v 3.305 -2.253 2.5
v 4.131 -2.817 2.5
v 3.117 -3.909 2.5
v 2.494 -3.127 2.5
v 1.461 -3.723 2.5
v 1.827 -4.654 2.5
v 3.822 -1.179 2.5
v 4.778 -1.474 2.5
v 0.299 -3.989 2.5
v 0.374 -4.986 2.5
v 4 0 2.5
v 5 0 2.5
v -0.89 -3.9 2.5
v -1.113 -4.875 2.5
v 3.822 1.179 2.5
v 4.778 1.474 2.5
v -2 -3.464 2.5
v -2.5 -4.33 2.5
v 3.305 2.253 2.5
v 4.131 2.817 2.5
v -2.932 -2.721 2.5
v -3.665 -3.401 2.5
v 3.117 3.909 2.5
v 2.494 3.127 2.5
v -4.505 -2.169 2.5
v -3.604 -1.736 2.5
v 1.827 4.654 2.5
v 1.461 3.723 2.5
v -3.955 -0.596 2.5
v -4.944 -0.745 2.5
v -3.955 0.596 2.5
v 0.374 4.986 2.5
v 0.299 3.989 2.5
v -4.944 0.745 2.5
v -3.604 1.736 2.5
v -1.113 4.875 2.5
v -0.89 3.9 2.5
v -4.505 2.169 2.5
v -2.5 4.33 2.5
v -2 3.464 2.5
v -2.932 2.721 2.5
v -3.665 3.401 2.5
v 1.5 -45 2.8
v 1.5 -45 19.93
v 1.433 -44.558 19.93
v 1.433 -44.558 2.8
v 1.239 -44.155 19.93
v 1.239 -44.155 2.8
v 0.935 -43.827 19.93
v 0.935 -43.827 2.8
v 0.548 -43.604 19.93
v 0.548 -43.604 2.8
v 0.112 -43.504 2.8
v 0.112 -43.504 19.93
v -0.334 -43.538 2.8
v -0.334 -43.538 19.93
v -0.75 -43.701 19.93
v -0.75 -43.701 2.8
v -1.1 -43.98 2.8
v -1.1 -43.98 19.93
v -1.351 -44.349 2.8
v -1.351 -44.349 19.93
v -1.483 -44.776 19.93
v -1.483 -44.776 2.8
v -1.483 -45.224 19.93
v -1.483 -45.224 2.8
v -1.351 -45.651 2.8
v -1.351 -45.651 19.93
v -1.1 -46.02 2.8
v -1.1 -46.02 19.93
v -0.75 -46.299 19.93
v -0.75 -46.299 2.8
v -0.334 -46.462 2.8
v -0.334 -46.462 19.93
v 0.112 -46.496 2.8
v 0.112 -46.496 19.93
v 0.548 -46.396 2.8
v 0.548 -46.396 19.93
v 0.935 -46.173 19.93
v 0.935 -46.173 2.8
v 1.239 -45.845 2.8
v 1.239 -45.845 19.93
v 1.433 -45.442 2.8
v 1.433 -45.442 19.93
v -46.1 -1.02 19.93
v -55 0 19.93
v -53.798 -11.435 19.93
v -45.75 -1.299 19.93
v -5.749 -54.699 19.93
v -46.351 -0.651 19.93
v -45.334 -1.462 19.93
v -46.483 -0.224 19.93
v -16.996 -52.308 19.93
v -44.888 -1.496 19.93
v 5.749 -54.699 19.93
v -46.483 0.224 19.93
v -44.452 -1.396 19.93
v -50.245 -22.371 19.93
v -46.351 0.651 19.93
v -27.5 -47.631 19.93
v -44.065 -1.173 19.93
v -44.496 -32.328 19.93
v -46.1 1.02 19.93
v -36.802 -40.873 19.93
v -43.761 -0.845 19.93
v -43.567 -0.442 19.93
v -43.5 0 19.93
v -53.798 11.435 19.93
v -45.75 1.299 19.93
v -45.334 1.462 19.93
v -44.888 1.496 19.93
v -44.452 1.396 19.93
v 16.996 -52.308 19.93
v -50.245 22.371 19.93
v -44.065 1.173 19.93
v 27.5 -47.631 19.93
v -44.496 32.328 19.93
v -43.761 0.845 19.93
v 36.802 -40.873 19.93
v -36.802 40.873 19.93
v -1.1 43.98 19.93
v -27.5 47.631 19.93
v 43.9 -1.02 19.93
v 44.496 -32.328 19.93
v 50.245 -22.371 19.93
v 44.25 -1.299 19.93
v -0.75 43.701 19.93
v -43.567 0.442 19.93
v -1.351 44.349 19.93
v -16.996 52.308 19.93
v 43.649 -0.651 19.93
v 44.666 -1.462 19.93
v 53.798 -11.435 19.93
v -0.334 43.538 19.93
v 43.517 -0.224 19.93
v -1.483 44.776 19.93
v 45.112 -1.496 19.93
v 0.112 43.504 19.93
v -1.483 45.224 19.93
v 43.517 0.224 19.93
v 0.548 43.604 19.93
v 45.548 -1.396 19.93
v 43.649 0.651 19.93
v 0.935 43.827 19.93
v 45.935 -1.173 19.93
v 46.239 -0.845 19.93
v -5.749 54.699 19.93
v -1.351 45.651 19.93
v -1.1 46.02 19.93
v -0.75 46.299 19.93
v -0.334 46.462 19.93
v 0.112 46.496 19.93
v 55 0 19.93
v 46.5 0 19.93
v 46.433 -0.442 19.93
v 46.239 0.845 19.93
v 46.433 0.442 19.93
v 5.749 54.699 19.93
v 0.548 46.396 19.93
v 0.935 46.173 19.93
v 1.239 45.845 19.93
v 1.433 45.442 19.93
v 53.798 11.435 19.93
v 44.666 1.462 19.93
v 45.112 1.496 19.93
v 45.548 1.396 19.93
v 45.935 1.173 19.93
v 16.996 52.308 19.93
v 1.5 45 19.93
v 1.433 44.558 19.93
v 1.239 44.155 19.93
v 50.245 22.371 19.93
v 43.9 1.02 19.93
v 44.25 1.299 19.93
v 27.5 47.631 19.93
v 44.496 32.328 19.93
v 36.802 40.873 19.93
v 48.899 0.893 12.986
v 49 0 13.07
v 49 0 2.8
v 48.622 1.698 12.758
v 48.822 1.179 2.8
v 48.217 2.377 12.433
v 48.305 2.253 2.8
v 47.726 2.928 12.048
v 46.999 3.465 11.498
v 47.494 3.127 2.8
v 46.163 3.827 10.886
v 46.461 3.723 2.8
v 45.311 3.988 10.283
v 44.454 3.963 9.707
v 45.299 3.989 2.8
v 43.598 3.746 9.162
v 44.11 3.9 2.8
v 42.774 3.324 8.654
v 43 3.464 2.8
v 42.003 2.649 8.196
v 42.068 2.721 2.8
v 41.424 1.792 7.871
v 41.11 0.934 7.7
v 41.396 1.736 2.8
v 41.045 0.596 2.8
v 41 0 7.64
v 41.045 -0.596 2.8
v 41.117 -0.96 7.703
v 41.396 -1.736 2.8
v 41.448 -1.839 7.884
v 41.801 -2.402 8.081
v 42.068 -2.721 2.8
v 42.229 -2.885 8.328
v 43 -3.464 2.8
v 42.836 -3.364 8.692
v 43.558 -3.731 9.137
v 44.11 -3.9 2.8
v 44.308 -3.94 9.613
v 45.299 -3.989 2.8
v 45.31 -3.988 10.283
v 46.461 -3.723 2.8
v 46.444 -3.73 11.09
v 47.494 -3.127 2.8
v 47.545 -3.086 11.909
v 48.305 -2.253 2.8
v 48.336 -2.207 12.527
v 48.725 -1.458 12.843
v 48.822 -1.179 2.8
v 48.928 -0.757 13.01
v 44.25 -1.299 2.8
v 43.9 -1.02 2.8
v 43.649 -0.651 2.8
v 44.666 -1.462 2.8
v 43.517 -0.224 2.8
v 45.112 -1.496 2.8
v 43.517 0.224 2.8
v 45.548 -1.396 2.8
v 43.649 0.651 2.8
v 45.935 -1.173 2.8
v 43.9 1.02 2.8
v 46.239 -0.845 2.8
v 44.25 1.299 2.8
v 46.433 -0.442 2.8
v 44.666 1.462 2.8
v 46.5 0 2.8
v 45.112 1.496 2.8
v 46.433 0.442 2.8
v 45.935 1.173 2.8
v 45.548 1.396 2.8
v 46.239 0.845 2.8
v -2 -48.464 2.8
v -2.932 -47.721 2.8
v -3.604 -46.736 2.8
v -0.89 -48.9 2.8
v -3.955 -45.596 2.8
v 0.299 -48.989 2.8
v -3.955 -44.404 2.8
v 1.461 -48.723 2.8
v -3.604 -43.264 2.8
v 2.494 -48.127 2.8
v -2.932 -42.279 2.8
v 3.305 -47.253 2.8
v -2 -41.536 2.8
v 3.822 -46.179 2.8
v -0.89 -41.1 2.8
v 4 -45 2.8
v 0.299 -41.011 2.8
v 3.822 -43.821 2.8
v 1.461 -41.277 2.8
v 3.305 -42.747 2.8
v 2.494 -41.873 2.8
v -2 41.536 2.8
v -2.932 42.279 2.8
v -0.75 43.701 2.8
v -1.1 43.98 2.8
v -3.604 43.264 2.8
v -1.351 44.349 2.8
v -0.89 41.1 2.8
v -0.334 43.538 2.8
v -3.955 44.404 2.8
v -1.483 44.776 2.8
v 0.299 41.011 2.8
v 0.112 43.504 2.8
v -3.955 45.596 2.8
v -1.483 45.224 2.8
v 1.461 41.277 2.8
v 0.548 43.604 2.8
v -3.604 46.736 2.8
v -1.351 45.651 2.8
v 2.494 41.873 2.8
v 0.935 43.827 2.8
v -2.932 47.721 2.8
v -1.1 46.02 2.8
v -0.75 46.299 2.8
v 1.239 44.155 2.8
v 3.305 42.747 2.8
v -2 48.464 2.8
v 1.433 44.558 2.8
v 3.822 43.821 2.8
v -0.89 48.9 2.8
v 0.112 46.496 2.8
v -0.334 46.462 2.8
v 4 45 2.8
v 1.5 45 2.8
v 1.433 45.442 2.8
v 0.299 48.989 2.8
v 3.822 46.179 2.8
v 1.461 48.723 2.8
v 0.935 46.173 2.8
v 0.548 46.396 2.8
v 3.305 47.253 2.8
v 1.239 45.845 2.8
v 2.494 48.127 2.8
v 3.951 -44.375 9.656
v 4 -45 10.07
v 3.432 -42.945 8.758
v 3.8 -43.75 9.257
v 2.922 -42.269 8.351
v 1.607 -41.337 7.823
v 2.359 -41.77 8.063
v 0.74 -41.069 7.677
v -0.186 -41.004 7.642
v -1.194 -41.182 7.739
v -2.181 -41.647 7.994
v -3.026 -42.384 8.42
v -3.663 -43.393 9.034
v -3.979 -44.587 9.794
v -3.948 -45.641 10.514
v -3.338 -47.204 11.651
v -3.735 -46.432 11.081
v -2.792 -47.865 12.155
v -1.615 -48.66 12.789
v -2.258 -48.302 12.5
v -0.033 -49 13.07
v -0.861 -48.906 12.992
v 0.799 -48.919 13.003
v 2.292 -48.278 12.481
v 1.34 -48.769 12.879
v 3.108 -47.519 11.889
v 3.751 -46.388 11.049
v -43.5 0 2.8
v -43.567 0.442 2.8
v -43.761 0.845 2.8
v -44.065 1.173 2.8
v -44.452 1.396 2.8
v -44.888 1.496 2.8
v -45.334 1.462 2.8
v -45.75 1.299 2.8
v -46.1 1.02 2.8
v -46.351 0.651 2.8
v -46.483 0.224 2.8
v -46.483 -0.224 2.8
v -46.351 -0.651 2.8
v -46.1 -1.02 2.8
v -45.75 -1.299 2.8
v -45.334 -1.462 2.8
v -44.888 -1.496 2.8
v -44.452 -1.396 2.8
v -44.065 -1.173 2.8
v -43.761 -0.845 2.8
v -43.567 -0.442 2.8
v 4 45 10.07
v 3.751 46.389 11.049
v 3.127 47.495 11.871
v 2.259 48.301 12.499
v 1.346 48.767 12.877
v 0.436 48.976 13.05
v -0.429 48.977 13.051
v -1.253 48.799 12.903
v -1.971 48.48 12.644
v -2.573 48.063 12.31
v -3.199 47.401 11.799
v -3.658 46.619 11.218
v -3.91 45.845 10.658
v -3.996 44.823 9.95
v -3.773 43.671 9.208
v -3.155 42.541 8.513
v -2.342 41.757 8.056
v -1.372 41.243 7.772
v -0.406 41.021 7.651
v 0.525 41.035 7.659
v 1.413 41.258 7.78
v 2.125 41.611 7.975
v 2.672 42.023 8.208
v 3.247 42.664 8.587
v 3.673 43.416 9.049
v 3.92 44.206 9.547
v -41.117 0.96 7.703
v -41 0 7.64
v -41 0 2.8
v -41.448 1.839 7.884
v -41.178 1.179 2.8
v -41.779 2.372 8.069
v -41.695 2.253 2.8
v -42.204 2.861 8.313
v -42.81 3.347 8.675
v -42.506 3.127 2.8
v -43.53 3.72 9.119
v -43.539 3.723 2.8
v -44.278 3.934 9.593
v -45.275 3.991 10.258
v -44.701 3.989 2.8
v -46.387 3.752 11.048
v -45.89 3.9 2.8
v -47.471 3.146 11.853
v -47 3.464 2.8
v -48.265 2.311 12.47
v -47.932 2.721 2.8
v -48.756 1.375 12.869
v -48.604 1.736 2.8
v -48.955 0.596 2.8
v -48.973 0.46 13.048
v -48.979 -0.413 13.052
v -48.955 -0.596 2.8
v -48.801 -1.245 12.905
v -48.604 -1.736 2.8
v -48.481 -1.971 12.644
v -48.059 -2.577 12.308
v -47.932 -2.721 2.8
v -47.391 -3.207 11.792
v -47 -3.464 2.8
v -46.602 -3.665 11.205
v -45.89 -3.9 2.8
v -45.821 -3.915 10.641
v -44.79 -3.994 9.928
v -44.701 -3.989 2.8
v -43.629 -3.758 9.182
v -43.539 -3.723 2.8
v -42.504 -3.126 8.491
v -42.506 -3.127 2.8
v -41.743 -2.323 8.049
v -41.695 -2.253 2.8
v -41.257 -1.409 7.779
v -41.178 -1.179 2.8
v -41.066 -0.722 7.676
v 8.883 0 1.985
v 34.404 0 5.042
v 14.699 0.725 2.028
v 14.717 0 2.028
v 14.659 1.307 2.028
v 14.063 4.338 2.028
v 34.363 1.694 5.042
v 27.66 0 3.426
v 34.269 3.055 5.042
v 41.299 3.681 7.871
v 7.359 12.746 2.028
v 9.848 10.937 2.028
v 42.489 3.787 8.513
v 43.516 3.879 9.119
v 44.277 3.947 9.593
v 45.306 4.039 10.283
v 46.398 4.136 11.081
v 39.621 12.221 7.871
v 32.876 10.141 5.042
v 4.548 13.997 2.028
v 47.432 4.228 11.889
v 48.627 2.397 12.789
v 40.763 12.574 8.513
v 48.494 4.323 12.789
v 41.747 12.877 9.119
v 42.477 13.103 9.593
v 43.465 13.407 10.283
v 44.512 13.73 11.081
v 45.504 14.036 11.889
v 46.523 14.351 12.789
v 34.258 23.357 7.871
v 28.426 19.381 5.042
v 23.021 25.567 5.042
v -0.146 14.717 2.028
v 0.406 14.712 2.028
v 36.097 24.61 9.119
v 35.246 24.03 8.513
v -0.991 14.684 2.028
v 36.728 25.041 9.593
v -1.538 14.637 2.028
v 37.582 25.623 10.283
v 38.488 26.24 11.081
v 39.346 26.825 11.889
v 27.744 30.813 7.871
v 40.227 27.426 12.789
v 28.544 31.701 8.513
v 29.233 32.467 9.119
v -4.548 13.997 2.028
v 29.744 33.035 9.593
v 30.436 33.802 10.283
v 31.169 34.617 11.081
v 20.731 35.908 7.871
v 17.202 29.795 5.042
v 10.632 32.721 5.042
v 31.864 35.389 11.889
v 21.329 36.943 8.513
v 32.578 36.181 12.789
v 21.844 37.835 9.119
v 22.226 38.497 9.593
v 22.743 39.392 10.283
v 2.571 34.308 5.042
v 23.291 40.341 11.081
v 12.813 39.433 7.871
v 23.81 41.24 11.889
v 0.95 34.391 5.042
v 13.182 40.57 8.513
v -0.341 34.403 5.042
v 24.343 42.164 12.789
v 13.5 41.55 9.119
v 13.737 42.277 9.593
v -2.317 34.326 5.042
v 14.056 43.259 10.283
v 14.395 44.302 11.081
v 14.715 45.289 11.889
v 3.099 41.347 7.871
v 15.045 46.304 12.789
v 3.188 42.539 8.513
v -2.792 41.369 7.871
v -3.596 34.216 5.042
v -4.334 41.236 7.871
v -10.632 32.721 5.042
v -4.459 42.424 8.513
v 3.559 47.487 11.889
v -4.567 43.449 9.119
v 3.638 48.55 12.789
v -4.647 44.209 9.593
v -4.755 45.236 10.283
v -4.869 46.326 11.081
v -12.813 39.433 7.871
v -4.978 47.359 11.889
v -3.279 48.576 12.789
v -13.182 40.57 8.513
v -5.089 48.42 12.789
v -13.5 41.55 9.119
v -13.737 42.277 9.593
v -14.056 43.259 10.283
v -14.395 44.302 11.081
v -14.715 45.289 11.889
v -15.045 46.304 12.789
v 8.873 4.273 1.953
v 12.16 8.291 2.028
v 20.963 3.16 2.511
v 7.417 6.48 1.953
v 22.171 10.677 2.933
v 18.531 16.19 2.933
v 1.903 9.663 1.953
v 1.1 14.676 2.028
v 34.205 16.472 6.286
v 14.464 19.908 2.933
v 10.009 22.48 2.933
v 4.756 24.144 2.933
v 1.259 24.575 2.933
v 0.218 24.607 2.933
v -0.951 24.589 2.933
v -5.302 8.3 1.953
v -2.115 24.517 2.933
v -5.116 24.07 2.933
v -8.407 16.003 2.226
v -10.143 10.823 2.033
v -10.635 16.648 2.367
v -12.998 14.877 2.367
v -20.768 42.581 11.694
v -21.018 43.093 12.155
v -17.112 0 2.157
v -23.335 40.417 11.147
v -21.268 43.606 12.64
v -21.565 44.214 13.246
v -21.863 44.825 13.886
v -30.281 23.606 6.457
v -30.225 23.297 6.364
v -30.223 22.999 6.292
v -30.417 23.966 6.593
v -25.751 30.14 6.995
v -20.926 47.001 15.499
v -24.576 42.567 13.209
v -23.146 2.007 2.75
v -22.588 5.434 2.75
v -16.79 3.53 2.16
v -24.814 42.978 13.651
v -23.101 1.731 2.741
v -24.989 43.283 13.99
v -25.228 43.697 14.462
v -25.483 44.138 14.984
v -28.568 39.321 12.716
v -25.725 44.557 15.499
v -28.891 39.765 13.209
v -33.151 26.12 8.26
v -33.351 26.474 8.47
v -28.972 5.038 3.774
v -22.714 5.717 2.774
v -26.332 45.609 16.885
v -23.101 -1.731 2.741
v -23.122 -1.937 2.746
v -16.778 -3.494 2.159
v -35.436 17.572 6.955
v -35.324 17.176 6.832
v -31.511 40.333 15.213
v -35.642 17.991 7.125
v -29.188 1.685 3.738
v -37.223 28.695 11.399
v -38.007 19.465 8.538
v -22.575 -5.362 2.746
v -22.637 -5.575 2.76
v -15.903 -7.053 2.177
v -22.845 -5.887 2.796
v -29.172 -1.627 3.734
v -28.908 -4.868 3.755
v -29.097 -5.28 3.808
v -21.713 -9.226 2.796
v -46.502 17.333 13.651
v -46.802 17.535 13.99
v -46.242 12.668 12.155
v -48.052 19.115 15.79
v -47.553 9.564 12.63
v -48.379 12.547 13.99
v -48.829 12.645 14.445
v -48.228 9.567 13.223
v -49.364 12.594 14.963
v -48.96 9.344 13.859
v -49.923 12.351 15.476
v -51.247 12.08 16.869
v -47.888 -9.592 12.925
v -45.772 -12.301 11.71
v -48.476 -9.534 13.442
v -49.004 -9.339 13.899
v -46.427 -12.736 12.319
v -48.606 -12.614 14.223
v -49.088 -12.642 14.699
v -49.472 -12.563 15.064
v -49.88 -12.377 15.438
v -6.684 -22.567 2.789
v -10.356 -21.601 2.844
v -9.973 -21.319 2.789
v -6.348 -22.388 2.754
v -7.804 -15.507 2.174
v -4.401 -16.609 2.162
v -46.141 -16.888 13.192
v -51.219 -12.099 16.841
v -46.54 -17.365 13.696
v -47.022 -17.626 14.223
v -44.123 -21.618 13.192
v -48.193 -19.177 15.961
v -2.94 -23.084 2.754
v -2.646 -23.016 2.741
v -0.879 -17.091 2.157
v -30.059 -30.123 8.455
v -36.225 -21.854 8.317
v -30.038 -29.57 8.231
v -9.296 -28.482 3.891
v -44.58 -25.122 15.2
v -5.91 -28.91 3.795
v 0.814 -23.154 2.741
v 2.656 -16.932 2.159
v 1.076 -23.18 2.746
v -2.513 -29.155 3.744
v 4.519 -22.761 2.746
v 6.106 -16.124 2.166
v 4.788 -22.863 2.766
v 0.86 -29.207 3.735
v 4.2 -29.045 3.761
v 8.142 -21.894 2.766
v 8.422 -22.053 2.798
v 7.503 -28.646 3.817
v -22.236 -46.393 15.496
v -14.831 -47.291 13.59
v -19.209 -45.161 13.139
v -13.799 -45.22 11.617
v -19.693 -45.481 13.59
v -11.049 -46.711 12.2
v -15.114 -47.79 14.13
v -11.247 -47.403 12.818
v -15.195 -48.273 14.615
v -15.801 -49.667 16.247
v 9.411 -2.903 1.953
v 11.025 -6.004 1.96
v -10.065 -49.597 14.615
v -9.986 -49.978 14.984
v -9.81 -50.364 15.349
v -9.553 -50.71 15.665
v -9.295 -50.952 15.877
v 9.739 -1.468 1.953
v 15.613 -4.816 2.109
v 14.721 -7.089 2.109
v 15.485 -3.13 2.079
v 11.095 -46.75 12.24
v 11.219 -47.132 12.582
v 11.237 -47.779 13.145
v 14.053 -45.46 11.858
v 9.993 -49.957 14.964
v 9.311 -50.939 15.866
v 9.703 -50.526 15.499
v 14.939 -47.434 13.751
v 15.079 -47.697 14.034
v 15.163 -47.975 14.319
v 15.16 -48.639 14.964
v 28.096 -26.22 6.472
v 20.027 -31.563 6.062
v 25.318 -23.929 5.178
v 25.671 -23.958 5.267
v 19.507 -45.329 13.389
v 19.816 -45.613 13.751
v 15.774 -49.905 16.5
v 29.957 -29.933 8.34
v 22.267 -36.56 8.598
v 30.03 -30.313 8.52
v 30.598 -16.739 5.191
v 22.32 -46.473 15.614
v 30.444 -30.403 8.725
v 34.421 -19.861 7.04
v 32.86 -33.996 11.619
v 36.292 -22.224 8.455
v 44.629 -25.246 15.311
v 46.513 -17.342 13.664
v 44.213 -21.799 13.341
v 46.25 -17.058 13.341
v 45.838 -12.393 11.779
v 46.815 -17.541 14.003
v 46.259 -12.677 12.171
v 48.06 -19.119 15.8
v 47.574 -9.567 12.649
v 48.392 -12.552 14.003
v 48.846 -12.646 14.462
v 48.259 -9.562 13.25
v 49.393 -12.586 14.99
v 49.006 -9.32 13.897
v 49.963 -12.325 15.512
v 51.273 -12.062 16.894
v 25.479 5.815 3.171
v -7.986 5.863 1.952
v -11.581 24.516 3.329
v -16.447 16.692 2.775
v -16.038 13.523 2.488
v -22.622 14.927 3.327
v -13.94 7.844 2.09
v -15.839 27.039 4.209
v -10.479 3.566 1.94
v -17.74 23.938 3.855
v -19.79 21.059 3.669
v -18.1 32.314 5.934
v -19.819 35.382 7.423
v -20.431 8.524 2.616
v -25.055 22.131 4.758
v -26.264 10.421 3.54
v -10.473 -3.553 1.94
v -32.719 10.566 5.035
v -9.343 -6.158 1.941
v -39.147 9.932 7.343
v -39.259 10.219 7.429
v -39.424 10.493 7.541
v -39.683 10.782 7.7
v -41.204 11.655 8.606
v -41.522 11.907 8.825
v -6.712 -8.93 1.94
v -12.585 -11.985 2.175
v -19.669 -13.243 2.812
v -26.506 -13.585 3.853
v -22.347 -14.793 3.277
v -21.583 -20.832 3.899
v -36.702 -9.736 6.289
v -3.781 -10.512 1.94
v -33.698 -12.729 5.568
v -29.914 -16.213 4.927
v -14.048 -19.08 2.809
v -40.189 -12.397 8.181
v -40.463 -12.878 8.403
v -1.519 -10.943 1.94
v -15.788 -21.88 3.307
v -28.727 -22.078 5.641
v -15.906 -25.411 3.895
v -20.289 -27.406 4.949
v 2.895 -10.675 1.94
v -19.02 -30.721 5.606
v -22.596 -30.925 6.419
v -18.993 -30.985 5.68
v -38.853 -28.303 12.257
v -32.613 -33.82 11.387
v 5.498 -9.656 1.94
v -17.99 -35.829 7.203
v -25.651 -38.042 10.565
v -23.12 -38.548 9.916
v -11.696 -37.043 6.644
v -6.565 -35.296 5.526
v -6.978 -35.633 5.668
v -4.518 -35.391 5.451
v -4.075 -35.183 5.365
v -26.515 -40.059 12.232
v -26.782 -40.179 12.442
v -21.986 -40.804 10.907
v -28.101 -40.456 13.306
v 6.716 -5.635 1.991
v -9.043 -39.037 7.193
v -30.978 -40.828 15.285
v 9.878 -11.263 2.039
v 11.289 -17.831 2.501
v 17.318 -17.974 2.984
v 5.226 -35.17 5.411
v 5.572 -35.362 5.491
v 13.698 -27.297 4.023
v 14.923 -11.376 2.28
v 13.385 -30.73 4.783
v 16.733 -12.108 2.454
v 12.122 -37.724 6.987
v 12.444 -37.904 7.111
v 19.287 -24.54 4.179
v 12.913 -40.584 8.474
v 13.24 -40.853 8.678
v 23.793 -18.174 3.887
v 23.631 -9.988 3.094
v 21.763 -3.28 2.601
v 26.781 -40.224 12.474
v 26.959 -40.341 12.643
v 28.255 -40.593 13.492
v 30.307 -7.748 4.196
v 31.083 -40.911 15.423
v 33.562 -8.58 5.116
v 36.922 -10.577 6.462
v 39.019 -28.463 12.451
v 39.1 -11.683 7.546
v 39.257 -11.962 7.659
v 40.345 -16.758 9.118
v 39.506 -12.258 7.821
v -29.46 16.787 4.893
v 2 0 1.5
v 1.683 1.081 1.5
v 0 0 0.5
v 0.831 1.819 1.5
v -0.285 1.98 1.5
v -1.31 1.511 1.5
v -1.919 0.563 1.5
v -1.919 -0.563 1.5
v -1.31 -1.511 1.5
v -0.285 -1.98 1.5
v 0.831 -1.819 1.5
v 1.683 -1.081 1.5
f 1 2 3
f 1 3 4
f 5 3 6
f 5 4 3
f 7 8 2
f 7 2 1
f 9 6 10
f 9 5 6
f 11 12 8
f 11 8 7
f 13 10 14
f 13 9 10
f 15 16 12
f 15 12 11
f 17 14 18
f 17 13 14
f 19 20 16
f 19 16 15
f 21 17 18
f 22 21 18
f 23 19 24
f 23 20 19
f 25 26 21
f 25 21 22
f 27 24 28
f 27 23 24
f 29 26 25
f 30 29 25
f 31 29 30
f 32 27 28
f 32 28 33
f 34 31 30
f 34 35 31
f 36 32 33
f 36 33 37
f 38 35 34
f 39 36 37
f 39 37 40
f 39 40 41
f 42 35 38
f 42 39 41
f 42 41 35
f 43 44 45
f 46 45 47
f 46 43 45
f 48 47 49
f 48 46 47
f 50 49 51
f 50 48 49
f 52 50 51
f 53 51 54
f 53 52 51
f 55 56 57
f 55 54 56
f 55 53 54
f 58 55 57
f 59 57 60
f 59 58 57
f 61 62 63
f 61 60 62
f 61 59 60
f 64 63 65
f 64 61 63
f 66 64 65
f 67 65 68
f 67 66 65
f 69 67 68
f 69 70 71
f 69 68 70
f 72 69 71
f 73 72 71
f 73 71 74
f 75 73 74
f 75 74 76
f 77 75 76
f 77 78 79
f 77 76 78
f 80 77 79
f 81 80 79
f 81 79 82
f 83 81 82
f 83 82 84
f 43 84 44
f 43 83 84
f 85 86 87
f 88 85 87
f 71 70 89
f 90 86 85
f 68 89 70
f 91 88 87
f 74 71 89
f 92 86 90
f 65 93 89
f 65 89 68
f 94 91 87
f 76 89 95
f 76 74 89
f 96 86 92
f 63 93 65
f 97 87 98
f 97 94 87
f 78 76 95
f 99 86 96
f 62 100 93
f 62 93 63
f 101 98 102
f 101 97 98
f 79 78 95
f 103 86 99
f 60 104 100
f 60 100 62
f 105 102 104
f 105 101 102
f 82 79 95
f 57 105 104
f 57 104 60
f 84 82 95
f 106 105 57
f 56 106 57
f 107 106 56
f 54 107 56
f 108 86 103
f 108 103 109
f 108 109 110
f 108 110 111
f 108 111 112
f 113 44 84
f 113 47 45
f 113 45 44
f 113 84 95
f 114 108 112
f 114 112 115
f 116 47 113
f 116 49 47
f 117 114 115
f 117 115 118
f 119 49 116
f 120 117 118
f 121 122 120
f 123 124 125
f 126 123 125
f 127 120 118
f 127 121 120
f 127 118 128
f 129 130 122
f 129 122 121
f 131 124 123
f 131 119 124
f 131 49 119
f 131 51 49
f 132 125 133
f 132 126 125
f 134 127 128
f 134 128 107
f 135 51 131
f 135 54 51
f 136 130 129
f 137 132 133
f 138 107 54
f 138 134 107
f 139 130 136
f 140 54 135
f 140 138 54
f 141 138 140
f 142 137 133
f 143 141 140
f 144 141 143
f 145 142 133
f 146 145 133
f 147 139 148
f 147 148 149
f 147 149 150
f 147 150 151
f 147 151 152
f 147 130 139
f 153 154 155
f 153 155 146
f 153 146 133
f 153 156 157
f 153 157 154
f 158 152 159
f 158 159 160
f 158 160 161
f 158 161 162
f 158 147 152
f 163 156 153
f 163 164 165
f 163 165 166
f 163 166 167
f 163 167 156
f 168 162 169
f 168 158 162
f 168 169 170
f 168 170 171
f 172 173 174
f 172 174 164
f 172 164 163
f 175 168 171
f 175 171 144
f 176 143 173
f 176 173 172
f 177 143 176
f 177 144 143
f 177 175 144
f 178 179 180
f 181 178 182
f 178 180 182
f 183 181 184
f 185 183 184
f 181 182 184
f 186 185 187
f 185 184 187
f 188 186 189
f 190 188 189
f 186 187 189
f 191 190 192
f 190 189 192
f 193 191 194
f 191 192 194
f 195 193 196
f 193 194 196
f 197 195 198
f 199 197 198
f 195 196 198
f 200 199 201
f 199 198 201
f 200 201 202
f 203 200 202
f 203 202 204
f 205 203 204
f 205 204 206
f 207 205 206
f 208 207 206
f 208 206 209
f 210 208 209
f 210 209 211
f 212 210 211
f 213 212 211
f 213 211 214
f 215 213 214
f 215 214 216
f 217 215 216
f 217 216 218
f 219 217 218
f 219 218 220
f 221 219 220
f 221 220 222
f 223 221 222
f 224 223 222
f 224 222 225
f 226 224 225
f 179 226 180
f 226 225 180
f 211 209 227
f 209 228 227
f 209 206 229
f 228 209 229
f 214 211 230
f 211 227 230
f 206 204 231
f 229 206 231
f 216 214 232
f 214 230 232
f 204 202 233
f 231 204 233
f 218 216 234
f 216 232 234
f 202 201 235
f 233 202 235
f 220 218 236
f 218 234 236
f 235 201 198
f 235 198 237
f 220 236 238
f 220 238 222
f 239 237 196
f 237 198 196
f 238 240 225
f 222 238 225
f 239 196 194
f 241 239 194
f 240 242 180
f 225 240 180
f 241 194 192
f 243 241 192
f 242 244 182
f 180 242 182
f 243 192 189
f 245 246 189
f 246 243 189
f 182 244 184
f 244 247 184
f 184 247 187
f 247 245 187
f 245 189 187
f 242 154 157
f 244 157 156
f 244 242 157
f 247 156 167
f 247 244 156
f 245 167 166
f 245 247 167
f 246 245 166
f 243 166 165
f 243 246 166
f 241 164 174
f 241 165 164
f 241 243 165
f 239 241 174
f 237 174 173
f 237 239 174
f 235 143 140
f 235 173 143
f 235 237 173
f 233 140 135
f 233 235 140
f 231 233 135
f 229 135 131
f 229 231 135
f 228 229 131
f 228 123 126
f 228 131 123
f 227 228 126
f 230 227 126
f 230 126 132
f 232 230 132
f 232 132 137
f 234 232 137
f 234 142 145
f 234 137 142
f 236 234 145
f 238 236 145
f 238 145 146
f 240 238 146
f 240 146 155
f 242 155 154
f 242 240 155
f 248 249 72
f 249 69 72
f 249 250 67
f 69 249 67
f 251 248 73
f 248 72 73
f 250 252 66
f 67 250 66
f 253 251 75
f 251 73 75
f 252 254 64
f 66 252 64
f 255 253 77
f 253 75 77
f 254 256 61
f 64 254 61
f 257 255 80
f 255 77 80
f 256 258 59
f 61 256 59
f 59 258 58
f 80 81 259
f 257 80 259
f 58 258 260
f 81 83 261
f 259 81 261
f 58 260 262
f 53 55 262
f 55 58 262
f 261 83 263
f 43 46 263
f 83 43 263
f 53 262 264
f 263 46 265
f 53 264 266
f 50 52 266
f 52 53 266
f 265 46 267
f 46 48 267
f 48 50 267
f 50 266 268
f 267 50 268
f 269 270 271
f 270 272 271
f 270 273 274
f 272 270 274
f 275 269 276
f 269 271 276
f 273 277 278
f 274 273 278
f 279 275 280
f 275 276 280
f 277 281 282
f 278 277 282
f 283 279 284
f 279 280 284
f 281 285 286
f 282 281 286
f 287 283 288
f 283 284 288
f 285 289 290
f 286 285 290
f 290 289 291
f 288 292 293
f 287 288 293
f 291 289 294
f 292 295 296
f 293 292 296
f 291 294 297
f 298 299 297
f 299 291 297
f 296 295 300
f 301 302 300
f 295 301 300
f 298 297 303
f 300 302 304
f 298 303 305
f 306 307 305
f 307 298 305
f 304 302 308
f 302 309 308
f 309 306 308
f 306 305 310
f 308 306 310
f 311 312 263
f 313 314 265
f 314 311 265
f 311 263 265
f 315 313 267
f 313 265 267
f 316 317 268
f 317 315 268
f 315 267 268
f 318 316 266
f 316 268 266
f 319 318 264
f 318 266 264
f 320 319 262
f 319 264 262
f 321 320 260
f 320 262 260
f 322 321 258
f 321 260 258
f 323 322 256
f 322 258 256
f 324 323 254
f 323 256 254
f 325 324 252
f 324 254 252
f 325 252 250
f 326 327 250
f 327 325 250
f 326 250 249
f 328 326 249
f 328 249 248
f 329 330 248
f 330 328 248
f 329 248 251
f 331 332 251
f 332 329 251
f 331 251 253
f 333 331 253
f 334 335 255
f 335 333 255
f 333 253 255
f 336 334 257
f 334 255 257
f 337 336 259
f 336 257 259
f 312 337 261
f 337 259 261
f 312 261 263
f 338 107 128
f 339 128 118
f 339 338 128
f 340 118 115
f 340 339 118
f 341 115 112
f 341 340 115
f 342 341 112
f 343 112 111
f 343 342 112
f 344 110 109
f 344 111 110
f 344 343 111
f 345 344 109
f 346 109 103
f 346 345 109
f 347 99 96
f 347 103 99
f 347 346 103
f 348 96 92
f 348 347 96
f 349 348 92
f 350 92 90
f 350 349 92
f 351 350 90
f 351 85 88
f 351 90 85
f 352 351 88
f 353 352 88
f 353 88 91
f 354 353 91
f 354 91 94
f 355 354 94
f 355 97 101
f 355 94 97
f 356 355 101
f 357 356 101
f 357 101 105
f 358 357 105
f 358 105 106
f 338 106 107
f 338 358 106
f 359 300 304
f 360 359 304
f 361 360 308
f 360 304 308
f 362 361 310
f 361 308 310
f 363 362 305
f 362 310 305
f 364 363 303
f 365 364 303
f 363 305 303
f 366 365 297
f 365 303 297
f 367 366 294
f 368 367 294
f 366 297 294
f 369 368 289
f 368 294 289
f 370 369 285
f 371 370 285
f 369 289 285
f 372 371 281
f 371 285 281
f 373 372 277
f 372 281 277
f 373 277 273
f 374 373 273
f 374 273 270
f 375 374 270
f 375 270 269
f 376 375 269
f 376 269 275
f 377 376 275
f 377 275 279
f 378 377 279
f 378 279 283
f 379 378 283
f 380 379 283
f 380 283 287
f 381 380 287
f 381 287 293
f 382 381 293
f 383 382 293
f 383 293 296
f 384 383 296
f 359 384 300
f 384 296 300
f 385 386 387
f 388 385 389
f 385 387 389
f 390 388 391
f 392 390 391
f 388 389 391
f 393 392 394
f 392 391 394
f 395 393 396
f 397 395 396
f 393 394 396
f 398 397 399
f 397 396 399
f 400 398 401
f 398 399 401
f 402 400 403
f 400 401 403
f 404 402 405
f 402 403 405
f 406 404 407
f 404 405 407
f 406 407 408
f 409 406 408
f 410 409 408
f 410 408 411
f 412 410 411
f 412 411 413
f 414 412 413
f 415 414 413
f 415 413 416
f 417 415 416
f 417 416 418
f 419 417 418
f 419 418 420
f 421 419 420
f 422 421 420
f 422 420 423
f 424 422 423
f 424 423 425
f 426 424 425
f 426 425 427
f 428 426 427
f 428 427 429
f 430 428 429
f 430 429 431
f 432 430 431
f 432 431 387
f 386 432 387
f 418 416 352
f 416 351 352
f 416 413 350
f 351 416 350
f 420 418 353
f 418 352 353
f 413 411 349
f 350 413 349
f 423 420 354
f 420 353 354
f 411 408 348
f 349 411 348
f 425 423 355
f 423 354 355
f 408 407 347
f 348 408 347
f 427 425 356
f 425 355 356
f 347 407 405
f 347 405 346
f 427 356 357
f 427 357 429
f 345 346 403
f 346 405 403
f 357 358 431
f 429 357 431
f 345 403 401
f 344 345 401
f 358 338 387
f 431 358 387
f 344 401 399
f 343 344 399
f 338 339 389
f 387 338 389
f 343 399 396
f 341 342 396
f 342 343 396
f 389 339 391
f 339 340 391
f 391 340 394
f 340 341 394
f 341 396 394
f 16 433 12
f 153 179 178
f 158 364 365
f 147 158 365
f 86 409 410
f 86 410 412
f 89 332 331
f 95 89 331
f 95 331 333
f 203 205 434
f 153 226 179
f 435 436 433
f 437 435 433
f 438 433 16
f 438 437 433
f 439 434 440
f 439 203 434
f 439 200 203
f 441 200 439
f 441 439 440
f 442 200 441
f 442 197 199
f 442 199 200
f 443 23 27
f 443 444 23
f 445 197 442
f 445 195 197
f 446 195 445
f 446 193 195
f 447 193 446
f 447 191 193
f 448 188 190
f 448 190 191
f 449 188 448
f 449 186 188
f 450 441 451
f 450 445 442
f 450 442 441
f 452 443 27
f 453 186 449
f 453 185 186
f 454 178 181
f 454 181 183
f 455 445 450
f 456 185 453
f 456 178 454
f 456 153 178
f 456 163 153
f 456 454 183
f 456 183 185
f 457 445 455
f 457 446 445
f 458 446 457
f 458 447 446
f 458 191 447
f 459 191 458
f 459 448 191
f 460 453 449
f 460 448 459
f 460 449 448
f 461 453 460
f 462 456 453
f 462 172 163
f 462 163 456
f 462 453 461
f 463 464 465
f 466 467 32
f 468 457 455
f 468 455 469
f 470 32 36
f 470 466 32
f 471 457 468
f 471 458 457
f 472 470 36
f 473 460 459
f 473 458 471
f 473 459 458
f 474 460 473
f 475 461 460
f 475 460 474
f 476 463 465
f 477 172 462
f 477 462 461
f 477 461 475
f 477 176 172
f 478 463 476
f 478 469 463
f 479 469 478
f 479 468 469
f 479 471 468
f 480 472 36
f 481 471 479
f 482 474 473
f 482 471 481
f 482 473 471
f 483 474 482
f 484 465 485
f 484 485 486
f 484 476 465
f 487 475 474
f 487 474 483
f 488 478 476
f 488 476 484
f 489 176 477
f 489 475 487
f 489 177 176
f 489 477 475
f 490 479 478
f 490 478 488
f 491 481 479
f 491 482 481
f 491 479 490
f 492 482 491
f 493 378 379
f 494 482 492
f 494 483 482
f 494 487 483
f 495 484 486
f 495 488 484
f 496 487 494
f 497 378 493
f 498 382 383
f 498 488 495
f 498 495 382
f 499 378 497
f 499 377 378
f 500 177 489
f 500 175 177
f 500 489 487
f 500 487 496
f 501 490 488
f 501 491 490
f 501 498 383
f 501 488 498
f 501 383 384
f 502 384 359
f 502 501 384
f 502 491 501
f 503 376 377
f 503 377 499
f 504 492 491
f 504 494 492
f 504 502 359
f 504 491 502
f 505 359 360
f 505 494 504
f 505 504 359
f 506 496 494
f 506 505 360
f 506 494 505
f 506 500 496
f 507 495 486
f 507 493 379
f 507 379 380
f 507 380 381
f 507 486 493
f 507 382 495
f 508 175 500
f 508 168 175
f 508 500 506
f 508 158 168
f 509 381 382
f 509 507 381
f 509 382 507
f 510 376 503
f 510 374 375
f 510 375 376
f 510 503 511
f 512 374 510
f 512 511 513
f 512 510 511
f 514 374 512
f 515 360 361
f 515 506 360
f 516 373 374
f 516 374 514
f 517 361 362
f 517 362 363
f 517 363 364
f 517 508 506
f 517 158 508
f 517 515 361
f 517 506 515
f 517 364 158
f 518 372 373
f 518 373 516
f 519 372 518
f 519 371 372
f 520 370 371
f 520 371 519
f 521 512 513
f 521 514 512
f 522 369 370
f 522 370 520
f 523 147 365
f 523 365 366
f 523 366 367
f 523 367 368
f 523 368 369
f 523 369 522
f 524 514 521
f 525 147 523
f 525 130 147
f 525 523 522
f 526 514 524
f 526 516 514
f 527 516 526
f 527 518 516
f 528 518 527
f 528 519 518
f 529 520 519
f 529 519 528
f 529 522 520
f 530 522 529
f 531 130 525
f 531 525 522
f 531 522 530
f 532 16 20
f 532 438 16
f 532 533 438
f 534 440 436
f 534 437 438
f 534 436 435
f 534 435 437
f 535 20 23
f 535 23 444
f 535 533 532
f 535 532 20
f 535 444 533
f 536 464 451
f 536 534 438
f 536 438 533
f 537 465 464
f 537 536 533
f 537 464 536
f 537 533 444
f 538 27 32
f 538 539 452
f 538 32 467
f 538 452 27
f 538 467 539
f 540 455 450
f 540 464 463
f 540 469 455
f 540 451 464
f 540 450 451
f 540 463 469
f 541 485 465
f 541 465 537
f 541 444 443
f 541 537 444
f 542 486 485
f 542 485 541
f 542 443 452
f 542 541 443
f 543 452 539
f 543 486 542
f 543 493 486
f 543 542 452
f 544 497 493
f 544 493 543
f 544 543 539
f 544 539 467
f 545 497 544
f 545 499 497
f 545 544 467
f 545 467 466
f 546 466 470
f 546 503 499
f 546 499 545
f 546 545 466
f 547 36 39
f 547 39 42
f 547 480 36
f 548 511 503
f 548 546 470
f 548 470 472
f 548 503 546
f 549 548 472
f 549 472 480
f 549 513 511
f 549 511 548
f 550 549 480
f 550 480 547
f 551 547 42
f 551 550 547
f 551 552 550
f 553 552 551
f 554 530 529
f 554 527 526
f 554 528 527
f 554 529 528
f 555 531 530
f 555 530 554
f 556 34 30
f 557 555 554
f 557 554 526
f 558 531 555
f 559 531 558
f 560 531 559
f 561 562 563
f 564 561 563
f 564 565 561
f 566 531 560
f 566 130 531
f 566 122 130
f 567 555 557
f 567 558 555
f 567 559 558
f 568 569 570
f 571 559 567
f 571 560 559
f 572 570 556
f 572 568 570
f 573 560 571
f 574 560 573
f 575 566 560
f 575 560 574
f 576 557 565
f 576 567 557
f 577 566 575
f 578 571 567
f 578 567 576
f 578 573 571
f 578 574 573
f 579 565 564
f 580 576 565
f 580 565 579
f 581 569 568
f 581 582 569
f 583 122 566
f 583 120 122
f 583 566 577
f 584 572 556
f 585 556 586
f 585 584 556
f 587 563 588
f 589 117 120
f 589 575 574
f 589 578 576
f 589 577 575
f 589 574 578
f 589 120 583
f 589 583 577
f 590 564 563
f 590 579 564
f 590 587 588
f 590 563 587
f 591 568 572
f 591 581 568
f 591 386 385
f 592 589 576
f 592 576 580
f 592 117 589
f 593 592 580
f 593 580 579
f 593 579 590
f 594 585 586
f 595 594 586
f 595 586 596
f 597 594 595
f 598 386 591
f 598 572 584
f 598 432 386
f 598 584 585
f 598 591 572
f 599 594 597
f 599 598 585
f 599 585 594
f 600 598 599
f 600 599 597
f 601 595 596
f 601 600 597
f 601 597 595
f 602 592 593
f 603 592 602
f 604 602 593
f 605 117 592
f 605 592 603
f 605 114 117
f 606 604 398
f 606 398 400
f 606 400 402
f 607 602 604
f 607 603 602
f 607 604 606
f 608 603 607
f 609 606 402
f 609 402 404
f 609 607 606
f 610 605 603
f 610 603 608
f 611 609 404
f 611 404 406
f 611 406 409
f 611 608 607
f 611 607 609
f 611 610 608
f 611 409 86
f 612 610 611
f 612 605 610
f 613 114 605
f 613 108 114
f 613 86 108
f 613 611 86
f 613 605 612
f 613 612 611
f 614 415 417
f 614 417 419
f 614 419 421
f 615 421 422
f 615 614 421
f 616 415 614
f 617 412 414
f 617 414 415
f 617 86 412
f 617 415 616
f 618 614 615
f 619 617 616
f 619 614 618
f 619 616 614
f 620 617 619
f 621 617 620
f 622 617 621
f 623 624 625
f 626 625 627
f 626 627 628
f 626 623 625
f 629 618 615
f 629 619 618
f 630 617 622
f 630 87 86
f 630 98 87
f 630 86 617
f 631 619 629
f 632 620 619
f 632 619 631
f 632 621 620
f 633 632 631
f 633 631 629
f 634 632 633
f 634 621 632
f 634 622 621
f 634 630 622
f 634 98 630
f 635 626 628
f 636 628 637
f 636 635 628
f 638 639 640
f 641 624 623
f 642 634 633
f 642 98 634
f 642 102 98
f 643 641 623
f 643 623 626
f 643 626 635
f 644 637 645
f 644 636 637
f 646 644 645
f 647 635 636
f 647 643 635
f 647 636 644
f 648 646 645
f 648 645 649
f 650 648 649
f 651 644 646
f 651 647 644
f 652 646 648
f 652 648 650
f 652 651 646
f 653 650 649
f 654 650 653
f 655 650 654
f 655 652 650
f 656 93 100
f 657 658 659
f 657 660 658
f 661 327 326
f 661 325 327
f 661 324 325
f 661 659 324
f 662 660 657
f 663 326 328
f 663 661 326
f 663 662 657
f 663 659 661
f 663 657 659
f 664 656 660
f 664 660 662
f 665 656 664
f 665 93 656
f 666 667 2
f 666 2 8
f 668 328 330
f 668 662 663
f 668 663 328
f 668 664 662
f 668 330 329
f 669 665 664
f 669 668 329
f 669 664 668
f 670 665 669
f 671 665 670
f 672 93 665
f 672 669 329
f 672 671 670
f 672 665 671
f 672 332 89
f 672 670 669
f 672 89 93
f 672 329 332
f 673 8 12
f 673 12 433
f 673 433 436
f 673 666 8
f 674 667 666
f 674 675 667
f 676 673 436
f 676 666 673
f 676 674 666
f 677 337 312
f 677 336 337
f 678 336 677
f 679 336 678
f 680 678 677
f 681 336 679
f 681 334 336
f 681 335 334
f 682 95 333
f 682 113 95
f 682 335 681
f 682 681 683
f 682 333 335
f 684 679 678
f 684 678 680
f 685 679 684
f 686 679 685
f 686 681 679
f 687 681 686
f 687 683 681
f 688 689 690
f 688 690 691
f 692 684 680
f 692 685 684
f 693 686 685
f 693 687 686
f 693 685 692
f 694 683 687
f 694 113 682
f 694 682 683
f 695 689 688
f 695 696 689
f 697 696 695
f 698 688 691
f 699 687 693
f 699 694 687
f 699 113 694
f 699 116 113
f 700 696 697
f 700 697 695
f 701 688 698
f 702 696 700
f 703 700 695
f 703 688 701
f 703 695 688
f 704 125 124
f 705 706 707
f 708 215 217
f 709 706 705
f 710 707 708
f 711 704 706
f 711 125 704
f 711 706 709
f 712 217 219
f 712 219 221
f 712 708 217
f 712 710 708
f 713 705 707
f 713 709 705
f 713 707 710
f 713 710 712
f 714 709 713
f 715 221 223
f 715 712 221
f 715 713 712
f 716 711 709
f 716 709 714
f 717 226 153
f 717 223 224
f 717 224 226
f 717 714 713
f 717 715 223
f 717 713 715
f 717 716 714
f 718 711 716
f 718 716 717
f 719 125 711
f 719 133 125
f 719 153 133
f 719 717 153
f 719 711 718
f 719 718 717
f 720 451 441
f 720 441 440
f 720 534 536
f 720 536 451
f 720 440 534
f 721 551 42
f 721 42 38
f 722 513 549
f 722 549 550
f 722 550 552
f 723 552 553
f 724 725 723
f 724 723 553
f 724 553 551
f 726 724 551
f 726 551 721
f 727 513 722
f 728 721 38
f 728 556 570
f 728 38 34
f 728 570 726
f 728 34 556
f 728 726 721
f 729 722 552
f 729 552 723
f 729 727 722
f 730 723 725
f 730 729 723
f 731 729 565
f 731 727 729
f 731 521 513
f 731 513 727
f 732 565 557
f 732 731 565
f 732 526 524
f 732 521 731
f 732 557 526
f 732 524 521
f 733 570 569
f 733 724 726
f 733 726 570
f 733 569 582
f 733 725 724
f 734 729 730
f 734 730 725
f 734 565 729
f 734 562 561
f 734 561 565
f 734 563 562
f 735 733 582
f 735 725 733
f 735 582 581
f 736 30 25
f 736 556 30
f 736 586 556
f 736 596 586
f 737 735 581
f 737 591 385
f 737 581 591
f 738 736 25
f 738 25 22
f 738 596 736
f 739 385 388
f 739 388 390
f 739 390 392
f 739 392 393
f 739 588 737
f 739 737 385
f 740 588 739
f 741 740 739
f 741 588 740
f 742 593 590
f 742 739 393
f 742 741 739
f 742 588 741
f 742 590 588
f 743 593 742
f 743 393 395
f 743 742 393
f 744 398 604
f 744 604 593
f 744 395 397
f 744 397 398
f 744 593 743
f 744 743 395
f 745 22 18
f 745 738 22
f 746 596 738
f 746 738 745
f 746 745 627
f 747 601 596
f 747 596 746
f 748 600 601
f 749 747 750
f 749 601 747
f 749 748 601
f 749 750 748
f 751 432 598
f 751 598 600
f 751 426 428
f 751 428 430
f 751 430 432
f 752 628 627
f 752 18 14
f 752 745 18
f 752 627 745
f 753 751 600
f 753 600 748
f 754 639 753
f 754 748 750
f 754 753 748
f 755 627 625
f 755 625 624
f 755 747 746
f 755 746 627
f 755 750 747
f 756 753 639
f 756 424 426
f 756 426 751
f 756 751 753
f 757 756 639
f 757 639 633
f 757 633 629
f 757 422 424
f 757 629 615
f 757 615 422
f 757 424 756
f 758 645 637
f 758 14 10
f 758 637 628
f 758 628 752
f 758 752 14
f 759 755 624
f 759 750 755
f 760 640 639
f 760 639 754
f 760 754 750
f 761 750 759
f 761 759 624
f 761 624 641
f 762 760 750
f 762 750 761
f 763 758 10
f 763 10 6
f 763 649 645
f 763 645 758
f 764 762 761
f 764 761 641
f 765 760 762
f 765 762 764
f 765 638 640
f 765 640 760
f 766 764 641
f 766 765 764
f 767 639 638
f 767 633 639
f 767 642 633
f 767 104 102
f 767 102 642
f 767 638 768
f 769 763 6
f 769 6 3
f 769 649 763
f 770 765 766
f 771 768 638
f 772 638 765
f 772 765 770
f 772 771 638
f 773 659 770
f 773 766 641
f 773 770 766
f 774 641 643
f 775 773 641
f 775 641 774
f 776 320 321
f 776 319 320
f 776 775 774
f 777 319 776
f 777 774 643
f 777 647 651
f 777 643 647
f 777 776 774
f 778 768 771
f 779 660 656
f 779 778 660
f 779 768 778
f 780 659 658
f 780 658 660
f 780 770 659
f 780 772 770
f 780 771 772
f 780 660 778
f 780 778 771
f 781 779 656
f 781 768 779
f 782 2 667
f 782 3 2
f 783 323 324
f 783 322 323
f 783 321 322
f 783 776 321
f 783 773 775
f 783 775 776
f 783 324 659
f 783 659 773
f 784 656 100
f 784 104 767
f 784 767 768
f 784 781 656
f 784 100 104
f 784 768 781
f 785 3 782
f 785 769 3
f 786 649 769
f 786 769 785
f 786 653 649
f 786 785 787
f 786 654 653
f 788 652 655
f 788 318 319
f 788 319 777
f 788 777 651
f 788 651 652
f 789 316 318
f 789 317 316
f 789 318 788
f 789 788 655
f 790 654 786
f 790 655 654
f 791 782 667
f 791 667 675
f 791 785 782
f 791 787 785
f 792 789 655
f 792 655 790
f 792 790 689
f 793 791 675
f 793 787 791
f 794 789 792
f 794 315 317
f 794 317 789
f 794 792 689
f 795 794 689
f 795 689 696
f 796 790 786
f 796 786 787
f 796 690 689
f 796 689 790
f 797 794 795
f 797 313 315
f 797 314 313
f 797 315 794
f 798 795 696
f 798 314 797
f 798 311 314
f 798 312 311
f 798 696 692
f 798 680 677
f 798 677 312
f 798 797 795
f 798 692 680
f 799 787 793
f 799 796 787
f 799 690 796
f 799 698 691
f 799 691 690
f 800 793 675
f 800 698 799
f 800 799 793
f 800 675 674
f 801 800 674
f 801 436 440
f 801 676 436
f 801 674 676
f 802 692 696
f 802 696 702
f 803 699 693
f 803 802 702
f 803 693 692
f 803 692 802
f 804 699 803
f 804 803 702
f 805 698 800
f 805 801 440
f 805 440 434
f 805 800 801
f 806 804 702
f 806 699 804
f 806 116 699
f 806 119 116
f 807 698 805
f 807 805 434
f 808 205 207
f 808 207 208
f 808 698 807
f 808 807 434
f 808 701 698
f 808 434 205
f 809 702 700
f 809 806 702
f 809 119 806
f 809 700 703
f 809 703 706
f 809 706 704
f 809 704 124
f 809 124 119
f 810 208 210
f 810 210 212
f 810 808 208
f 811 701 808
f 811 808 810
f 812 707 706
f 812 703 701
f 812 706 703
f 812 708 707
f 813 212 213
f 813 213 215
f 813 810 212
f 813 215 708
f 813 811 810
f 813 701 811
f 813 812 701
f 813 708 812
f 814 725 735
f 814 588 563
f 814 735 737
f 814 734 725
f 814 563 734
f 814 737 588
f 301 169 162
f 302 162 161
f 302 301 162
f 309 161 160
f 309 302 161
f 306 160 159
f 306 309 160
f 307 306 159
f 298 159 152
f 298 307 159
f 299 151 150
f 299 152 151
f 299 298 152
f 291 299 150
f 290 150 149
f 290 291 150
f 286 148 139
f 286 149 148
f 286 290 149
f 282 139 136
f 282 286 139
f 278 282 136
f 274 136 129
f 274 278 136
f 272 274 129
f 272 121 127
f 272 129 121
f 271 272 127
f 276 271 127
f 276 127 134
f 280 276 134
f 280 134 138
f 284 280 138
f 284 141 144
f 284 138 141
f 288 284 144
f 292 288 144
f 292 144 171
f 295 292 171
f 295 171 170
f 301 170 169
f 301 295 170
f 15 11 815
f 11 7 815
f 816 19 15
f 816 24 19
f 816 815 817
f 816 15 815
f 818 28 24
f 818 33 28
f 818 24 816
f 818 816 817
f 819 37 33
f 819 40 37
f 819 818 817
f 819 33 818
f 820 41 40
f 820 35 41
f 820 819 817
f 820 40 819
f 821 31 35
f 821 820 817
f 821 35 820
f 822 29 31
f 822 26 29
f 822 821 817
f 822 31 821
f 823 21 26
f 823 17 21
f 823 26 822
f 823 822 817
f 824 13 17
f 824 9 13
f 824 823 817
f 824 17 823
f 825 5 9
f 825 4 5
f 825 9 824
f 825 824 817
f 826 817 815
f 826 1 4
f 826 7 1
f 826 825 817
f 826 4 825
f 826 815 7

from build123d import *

# Parameters (mm, degrees)
F3_R     = 4
F4_DEPTH = 12
F5_R     = 1.5
F6_DEPTH = 25


with BuildPart() as f1:
    # F0 (on Front) → F1 (revolve)
    with BuildSketch(Plane.XZ):
        with BuildLine():
            Line((0, 19.93), (0, 2.5))
            Line((0, 2.5), (5, 2.5))
            add(Edge.make_bspline(
                [(5, 2.5), (5.3328510826, 2.4217743273), (5.9964782101, 2.2658106511), (6.9983179352, 2.1197039578), (7.9995053084, 2.0366561555), (8.9996417233, 1.9739737746), (9.9999165926, 1.9475438797), (11.0000008446, 1.935865527), (12.0000383829, 1.9489951187), (13.0000622241, 1.9681576208), (14.0000874592, 1.9983838356), (15.0001122592, 2.0383255927), (16.0001370916, 2.0883442574), (17.0001618271, 2.148342783), (18.0001864282, 2.2183478788), (19.0002110875, 2.2983497638), (20.0002349857, 2.3883608236), (21.0002611249, 2.4883412474), (22.0002782257, 2.5984379641), (23.0003283544, 2.7181026114), (24.0002543135, 2.8493833922), (25.000895917, 2.9846630387), (25.9998052646, 3.1525131019), (27.0009227888, 3.3054508496), (28.0009713029, 3.4864375887), (29.0003478858, 3.6897873256), (30.0012434797, 3.8951500576), (31.0002728406, 4.1308468645), (32.0021624026, 4.3625117569), (33.0002529532, 4.6414496195), (34.0023629695, 4.9132136305), (35.0011881909, 5.2289056776), (36.0025557063, 5.5542640629), (37.0014311173, 5.9184670669), (38.0025624421, 6.2958891719), (39.0037946478, 6.7040678184), (40.0028107947, 7.1566870694), (41.0027396353, 7.6374785101), (42.0055454925, 8.1429278876), (43.004228325, 8.7064011364), (44.004224438, 9.306997806), (45.0073247322, 9.9432016714), (46.0057995192, 10.6465378886), (47.0058234103, 11.3970699492), (48.0088937531, 12.1945745949), (49.0086544899, 13.0664036563), (50.0086681154, 14.007093901), (51.009971062, 15.0171879868), (52.0113800481, 16.1070392374), (53.010593298, 17.2897231439), (54.0131863874, 18.5559560931), (54.6684343672, 19.4683264564), (55, 19.93)],
                knots=[0, 0, 0, 0, 0.0192342727, 0.0383486364, 0.0573953442, 0.0764207609, 0.0954333686, 0.1144421761, 0.1334509836, 0.1524612165, 0.1714738242, 0.1904897553, 0.2095099566, 0.2285353734, 0.2475669482, 0.2666056211, 0.285652329, 0.3047080049, 0.3237735783, 0.3428499742, 0.3619381127, 0.3810389089, 0.4001677438, 0.4192965787, 0.4384570424, 0.4576526715, 0.4768671915, 0.4961220706, 0.5153984017, 0.534744074, 0.5541144917, 0.5735639074, 0.5930698576, 0.6126662076, 0.6323264323, 0.6520876645, 0.6719928068, 0.6920124161, 0.7121517577, 0.7325015415, 0.7530286956, 0.7737405025, 0.7947415319, 0.8159934935, 0.837504215, 0.8593884201, 0.8816569315, 0.9043183574, 0.9274369188, 0.9510771906, 0.9752443002, 1, 1, 1, 1], degree=3))
            Line((55, 19.93), (0, 19.93))
        make_face()
    revolve(axis=Axis((0, 0, 5.0231479108), (0, 0, 1)))

    # F3 (on offset) → F4 (join)
    with BuildSketch(Plane.XY.offset(2.8)):
        with Locations((0, -45)):
            Circle(F3_R)
        with Locations((45, 0)):
            Circle(F3_R)
        with Locations((0, 45)):
            Circle(F3_R)
        with Locations((-45, 0)):
            Circle(F3_R)
    extrude(amount=F4_DEPTH)

    # F5 (on offset) → F6 (cut)
    with BuildSketch(Plane.XY.offset(2.8)):
        with Locations((45, 0)):
            Circle(F5_R)
        with Locations((0, -45)):
            Circle(F5_R)
        with Locations((-45, 0)):
            Circle(F5_R)
        with Locations((0, 45)):
            Circle(F5_R)
    extrude(amount=F6_DEPTH, mode=Mode.SUBTRACT)

    # F7 (on Front) → F8 (revolve)
    with BuildSketch(Plane.XZ):
        Polygon((4, 2.5), (0, 2.5), (0, 0.5), align=None)
    revolve(axis=Axis((0, 0, 9.9652772769), (0, 0, 1)))


solid = f1.part
